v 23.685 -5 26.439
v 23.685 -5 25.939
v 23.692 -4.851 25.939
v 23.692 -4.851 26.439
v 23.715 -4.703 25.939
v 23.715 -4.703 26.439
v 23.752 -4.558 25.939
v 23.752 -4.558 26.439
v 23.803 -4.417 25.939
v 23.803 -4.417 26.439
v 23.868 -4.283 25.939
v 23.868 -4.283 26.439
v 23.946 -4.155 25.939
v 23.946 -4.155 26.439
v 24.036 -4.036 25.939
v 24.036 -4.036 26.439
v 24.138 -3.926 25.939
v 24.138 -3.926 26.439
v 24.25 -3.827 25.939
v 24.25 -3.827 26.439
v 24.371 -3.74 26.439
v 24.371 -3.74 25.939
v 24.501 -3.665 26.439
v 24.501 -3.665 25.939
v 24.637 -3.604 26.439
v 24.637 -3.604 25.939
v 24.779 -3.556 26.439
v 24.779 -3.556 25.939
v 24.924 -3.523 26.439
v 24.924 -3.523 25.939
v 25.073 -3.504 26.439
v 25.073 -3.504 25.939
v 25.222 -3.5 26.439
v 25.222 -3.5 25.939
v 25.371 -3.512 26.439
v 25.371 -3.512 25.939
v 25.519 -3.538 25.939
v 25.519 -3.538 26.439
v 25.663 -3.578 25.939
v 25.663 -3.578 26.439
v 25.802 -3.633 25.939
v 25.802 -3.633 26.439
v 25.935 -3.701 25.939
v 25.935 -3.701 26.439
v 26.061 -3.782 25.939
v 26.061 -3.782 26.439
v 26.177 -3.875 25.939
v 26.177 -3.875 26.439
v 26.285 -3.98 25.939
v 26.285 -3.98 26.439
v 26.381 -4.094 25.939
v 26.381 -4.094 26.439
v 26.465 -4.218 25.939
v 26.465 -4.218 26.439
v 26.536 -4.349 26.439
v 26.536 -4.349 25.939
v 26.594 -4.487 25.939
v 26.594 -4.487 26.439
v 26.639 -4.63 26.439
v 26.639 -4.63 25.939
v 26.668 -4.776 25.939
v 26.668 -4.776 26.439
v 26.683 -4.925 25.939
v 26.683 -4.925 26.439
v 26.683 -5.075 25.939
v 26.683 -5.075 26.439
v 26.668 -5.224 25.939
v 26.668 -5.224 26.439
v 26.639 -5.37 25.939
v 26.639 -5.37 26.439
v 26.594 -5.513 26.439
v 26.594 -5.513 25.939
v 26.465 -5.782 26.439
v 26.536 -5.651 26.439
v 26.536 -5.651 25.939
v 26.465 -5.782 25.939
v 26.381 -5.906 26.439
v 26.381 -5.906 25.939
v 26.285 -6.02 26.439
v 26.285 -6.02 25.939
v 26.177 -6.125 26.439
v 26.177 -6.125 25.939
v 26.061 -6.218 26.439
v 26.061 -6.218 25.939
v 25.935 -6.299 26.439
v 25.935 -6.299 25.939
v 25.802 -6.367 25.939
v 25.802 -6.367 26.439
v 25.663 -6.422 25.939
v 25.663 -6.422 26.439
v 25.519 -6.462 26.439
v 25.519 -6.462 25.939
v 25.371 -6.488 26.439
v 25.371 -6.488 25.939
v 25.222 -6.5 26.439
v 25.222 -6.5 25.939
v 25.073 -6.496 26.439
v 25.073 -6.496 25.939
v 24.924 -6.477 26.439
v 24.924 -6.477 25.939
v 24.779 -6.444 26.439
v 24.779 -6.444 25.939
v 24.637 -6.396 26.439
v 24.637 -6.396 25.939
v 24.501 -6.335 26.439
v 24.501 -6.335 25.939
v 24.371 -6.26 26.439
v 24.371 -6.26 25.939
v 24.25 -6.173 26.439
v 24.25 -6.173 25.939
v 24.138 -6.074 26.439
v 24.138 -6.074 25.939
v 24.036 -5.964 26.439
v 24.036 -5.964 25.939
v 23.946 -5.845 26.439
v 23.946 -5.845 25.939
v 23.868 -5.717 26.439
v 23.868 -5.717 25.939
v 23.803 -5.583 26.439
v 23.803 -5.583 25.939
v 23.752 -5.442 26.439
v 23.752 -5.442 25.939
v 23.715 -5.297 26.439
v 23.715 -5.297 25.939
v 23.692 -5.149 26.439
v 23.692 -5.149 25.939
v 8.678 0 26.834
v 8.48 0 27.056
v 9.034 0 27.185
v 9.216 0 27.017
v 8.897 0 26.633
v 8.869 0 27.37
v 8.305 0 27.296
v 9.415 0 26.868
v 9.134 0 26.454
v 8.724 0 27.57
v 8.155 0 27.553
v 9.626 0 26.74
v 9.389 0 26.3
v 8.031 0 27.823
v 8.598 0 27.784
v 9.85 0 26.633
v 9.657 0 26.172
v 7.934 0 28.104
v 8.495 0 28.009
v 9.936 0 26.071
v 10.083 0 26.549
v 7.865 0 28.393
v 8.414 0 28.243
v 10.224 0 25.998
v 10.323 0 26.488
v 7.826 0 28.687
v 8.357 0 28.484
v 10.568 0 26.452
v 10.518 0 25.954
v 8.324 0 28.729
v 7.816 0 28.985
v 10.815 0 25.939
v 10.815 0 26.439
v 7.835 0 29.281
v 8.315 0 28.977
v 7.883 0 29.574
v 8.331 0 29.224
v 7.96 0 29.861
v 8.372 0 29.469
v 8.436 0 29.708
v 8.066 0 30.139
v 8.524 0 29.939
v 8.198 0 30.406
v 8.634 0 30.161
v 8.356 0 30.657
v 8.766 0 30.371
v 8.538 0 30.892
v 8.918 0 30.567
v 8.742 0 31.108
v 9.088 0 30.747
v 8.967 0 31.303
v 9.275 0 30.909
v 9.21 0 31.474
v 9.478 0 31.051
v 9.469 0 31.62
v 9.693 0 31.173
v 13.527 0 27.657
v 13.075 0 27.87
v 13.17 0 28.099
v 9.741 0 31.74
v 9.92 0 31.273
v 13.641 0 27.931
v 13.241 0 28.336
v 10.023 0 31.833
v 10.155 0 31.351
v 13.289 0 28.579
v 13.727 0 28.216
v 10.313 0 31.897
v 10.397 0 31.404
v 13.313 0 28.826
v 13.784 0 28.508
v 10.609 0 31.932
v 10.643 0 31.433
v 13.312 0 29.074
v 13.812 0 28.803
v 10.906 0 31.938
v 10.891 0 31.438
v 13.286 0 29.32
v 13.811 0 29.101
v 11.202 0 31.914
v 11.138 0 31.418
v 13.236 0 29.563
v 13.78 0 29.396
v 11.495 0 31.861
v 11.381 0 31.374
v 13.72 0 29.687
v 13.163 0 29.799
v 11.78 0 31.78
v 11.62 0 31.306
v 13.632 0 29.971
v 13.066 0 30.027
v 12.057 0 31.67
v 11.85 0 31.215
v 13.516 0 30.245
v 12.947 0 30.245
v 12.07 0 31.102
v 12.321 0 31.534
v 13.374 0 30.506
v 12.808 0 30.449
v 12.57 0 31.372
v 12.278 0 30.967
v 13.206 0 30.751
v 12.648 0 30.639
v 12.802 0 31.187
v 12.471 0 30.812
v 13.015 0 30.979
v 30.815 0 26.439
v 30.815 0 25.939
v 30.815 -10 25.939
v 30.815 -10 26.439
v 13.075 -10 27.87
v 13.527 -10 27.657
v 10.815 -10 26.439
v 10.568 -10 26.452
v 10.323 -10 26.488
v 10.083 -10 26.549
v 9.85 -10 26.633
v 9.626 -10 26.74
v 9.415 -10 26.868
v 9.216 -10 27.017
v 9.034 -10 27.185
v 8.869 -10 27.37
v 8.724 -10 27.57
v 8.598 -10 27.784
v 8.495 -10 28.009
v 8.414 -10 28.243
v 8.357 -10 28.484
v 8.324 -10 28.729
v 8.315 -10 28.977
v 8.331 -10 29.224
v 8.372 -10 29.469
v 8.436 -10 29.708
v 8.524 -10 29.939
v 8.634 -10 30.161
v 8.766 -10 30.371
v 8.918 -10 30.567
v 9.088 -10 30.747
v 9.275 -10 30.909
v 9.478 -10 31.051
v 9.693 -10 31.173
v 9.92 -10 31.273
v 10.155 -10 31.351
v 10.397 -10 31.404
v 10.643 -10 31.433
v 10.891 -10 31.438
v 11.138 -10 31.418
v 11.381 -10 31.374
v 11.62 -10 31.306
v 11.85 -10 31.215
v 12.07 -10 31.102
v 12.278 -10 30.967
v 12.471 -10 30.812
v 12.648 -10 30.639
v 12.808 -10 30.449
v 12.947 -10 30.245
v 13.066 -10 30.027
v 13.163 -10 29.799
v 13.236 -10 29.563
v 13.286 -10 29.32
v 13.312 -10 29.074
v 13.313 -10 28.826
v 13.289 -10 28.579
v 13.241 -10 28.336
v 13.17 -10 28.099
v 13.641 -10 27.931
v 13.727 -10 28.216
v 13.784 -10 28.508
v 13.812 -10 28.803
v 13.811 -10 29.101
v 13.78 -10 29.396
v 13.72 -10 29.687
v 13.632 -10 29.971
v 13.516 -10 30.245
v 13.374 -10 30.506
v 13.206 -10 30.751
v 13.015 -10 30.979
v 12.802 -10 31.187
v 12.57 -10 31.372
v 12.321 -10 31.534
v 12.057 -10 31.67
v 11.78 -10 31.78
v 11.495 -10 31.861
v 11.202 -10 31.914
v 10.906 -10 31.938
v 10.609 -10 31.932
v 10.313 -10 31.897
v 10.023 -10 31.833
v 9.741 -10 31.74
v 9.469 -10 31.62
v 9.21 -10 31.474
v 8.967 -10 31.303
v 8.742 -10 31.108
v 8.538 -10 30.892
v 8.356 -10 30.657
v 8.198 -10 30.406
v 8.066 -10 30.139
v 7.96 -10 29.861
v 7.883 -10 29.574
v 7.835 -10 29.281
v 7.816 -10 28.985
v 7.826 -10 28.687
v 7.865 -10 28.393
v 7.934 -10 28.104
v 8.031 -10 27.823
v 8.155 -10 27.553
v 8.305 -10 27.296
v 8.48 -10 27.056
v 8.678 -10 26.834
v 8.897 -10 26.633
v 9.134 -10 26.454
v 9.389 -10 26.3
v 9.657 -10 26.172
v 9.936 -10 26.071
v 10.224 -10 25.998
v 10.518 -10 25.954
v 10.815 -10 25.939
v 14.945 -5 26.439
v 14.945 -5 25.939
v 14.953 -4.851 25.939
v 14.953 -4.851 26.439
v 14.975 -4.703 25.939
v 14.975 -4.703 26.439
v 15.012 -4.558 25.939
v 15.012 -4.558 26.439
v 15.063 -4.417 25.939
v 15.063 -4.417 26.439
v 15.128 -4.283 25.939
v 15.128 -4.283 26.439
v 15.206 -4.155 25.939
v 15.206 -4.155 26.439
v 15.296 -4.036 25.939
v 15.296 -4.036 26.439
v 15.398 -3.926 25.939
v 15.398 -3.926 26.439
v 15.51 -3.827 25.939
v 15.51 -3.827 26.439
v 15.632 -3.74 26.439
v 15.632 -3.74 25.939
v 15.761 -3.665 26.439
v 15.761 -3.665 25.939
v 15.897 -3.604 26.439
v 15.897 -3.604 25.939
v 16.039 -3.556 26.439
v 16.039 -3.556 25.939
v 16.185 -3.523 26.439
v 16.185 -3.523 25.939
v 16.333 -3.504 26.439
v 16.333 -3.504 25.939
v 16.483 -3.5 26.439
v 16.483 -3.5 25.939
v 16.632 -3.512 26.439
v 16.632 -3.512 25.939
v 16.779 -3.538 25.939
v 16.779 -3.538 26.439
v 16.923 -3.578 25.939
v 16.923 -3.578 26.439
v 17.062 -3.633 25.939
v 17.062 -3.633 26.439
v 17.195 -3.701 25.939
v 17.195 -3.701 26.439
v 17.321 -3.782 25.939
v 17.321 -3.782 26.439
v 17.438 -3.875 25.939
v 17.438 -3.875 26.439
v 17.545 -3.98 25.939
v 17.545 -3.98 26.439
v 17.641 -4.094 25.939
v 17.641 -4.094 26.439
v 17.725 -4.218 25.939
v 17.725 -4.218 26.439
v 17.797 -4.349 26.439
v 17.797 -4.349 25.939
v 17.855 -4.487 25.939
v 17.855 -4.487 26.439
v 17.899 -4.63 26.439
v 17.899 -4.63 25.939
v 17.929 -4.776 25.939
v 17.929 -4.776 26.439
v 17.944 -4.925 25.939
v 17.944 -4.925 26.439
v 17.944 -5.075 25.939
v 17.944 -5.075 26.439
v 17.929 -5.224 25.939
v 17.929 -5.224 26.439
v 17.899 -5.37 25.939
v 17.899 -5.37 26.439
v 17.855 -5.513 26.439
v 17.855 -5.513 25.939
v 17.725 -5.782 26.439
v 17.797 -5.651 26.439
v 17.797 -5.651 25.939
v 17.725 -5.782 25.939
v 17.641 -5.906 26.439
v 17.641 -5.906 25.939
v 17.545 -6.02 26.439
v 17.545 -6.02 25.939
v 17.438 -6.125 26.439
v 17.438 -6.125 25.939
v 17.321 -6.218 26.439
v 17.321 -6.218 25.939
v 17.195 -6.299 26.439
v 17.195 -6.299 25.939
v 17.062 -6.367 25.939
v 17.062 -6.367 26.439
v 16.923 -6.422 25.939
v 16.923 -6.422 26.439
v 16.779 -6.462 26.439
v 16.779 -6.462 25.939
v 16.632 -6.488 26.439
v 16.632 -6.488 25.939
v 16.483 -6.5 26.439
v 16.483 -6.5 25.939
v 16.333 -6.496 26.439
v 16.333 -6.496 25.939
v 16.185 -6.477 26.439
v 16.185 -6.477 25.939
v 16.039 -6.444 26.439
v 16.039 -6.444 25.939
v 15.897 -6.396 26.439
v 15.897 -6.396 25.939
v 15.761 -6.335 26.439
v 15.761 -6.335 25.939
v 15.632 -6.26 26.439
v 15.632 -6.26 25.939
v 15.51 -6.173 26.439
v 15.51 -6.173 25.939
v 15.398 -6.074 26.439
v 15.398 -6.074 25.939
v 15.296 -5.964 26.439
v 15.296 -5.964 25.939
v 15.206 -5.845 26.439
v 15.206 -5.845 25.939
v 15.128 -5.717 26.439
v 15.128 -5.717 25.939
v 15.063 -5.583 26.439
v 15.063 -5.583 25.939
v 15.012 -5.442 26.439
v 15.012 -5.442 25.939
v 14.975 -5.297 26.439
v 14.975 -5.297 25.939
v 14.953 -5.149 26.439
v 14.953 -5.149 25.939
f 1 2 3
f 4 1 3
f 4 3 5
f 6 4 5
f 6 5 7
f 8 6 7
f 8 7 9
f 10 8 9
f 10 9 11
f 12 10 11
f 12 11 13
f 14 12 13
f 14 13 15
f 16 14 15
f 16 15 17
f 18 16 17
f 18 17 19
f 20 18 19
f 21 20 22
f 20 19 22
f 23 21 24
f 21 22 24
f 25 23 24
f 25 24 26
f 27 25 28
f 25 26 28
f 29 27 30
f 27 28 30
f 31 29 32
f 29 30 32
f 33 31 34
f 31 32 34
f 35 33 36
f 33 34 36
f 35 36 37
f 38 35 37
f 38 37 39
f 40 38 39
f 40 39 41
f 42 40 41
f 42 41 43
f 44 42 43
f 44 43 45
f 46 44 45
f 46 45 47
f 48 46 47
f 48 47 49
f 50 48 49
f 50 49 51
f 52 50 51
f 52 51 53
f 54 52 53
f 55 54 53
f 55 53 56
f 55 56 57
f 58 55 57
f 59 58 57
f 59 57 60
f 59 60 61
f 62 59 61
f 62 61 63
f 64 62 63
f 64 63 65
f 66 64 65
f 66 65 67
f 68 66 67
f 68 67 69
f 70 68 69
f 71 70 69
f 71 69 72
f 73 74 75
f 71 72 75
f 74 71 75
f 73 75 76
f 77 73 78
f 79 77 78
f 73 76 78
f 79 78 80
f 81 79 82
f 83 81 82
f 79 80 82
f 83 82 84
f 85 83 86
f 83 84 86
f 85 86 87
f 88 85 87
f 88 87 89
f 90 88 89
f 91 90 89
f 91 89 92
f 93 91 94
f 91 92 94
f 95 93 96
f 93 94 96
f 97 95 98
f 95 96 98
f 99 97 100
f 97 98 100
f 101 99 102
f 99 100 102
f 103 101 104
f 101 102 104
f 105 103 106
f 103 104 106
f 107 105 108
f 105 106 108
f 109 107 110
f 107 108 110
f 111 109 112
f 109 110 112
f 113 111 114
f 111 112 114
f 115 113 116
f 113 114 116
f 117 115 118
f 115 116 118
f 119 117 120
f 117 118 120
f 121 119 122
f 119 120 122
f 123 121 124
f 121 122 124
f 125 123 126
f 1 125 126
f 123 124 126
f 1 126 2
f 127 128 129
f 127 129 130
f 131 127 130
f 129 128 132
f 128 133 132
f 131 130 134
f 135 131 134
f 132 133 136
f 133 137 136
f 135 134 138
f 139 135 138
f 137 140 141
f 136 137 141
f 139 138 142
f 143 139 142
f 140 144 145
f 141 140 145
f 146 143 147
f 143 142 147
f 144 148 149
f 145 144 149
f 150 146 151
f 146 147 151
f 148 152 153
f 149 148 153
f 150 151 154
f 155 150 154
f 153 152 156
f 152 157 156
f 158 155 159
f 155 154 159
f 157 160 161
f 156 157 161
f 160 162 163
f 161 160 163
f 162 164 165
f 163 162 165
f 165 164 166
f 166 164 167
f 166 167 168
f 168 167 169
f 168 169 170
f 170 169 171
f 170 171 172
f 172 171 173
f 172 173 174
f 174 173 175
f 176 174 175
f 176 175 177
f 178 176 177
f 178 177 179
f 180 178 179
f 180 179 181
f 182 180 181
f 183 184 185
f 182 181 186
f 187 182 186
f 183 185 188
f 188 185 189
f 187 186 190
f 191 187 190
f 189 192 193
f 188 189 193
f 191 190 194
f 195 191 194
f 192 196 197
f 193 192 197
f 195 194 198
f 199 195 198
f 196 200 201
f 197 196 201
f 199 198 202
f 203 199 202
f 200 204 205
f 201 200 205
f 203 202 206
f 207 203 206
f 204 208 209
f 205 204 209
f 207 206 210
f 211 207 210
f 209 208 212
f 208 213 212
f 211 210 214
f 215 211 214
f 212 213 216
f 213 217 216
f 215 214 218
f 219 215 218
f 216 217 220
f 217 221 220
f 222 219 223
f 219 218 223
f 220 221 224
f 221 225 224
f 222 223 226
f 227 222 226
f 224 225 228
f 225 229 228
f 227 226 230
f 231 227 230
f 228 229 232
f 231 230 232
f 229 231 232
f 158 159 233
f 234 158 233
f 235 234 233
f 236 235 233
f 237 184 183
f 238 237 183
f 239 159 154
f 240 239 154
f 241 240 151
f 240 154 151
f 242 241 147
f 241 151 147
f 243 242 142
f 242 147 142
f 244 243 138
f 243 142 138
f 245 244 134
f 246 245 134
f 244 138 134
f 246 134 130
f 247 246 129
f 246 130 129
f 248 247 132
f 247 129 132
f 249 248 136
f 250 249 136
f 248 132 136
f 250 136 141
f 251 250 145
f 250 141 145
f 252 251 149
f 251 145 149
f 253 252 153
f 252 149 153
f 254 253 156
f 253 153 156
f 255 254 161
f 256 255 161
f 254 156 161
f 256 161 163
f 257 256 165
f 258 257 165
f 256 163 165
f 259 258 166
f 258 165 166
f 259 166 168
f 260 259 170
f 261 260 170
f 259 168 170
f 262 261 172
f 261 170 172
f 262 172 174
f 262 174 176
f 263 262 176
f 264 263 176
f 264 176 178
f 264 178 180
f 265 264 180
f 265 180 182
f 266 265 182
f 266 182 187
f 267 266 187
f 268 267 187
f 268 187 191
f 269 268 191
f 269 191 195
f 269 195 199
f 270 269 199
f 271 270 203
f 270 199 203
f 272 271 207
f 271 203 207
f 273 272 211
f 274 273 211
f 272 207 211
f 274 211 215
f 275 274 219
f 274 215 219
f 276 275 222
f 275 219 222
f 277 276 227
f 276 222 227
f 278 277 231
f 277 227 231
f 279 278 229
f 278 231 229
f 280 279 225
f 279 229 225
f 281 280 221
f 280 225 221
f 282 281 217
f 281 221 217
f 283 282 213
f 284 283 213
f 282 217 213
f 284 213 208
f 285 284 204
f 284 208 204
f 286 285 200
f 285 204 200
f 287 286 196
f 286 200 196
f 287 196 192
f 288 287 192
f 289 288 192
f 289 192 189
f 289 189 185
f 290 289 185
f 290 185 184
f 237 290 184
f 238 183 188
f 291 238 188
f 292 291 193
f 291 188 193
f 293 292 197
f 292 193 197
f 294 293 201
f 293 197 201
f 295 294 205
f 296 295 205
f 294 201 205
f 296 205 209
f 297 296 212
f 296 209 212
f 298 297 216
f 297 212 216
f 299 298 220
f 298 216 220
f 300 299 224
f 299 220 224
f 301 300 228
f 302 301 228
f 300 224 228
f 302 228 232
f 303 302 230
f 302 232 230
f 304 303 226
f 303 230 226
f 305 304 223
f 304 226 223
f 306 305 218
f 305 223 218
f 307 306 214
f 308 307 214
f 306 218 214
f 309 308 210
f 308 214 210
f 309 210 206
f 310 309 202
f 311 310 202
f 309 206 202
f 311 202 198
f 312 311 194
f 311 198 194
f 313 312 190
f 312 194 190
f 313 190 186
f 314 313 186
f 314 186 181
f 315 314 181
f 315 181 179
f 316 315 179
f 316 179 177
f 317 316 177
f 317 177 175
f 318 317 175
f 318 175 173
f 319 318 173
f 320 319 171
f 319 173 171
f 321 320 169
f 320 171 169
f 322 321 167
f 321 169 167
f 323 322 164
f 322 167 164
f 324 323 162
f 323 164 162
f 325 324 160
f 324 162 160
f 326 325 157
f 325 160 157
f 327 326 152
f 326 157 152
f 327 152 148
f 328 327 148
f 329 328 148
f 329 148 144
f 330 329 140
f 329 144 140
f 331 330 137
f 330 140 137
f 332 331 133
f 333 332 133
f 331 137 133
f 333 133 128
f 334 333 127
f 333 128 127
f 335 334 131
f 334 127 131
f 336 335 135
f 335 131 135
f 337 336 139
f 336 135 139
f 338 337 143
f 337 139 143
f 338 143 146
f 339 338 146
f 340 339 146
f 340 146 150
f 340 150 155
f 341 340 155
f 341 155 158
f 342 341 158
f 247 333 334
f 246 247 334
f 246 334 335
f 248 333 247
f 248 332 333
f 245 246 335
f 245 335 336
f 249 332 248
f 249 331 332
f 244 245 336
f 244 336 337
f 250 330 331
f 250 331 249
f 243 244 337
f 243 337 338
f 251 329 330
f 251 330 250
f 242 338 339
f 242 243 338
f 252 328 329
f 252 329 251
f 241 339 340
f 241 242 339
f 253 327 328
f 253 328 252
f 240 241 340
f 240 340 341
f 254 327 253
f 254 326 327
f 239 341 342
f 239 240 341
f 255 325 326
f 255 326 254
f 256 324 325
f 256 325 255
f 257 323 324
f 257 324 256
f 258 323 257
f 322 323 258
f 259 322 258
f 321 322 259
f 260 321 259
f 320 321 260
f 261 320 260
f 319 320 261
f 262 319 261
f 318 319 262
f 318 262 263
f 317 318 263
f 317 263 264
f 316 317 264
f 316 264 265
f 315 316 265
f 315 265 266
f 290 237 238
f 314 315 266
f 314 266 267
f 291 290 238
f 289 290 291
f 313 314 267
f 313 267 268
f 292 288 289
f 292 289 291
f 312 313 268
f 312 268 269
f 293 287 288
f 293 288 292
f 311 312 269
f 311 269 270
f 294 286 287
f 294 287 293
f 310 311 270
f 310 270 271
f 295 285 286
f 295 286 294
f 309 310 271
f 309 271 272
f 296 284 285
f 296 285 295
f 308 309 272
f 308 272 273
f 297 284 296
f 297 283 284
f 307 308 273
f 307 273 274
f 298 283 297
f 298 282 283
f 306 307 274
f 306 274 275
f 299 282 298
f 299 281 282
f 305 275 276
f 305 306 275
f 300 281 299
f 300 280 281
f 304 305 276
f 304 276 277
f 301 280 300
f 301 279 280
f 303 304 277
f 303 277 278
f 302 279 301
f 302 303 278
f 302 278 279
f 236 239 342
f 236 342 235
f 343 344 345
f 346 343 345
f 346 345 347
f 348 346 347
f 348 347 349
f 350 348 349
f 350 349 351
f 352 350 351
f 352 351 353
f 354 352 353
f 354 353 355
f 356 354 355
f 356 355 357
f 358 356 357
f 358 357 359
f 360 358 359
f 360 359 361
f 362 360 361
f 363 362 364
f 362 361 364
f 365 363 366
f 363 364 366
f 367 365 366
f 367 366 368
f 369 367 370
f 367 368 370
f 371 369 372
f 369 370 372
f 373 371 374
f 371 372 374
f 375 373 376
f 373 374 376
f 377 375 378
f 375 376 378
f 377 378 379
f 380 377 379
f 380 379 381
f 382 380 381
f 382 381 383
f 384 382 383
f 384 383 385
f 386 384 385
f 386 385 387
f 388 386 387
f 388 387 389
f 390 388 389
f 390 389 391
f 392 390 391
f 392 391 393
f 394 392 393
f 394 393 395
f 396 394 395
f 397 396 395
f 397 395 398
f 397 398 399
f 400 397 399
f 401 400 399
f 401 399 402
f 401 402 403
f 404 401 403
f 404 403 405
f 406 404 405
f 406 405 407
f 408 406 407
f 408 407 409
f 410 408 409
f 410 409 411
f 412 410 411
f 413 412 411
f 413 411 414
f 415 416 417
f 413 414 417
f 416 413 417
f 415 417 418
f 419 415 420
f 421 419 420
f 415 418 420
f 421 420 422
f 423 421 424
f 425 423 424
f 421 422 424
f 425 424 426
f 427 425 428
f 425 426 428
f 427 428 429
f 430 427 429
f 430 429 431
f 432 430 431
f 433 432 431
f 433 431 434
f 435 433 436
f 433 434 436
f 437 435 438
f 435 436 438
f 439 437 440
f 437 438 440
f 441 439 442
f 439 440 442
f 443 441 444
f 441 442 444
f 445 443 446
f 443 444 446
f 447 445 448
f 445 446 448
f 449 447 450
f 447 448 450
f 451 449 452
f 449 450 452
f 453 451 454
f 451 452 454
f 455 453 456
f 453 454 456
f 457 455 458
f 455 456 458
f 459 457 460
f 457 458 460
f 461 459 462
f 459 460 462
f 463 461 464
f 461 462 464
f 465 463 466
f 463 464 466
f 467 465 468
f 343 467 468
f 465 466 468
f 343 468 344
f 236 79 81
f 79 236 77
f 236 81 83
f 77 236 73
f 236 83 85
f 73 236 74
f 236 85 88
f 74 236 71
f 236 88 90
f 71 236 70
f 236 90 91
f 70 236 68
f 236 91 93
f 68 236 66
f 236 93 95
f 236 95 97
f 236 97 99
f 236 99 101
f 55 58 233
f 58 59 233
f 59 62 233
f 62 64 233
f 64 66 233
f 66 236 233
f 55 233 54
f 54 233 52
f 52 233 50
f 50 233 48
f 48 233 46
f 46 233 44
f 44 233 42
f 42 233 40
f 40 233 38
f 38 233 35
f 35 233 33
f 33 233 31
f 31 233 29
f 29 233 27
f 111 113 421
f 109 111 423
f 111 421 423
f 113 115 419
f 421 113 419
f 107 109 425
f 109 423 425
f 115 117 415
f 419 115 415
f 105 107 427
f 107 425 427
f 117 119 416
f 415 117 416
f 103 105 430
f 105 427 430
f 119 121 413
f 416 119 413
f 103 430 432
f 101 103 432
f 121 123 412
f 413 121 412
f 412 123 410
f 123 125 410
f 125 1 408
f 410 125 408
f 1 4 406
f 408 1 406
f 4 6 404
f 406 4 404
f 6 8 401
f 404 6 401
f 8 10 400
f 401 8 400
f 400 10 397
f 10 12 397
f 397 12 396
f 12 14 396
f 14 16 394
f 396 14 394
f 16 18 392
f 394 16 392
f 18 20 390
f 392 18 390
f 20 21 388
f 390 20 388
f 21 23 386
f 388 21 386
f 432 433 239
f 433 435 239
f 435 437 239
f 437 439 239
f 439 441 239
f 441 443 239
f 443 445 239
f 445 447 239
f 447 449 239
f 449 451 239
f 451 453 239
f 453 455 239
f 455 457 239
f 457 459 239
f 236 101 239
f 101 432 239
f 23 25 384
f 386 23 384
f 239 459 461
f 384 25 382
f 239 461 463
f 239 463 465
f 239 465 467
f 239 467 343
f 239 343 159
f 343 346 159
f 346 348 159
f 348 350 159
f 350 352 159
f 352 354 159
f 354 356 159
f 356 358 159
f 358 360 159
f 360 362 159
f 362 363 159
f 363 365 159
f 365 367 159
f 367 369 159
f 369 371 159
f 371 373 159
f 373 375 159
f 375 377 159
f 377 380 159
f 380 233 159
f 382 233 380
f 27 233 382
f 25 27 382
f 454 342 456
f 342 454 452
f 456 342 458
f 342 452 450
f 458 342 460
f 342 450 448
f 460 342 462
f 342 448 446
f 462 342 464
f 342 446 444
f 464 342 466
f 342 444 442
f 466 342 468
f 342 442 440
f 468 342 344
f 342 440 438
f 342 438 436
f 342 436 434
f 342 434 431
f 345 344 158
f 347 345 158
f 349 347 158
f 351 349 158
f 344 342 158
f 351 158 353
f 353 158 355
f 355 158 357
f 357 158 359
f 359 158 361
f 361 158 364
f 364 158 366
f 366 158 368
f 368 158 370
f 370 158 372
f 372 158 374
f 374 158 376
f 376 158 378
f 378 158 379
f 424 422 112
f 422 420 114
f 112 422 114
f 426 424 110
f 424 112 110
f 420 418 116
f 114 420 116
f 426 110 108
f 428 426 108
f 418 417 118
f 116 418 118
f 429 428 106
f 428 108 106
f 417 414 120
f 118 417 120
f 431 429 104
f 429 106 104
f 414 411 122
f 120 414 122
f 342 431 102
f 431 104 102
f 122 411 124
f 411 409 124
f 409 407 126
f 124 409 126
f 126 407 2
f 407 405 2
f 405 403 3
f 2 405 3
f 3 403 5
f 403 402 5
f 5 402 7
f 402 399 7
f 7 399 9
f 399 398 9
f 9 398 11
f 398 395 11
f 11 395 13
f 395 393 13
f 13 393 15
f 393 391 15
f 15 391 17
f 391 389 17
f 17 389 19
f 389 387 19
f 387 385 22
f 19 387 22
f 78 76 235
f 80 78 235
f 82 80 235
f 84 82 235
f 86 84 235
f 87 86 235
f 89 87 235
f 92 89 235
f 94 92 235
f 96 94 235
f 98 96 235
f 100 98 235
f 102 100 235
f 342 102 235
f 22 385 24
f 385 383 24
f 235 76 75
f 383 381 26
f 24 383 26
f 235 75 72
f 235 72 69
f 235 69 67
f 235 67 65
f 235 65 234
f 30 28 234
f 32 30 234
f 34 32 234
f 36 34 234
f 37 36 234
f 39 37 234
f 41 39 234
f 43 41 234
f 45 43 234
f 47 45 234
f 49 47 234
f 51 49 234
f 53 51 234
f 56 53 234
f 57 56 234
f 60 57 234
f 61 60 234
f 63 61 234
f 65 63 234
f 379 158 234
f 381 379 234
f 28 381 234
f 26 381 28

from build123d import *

# Parameters (mm, degrees)
F1_DEPTH = 10
F3_D     = 3


# Not quite as in the source:
# - ends of sketch curves that miss each other by under 0.0002 mm in the source are joined


with BuildPart() as f1:
    # F0 (on Front) → F1 (new body)
    with BuildSketch(Plane.XZ):
        with BuildLine():
            ThreePointArc((13.5271953943, 27.6566442743), (9.210189973, 31.473808666), (10.8152050392, 25.9392620325))
            Line((10.8152050392, 25.9392620325), (30.8152050392, 25.9392620325))
            Line((30.8152050392, 25.9392620325), (30.8152050392, 26.439262554))
            Line((30.8152050392, 26.439262554), (10.8152050392, 26.439262554))
            ThreePointArc((10.8152050392, 26.439262554), (9.4776924841, 31.0513842271), (13.0751970018, 27.8704139006))
            Line((13.0751970018, 27.8704139006), (13.5271953943, 27.6566442743))
        make_face()
    extrude(amount=F1_DEPTH)

    # F3 (through all)
    with Locations(Plane.XY.offset(26.439262554)):
        with Locations((16.4454622901, -5), (25.1849477884, -5)):
            Hole(F3_D / 2)


solid = f1.part
